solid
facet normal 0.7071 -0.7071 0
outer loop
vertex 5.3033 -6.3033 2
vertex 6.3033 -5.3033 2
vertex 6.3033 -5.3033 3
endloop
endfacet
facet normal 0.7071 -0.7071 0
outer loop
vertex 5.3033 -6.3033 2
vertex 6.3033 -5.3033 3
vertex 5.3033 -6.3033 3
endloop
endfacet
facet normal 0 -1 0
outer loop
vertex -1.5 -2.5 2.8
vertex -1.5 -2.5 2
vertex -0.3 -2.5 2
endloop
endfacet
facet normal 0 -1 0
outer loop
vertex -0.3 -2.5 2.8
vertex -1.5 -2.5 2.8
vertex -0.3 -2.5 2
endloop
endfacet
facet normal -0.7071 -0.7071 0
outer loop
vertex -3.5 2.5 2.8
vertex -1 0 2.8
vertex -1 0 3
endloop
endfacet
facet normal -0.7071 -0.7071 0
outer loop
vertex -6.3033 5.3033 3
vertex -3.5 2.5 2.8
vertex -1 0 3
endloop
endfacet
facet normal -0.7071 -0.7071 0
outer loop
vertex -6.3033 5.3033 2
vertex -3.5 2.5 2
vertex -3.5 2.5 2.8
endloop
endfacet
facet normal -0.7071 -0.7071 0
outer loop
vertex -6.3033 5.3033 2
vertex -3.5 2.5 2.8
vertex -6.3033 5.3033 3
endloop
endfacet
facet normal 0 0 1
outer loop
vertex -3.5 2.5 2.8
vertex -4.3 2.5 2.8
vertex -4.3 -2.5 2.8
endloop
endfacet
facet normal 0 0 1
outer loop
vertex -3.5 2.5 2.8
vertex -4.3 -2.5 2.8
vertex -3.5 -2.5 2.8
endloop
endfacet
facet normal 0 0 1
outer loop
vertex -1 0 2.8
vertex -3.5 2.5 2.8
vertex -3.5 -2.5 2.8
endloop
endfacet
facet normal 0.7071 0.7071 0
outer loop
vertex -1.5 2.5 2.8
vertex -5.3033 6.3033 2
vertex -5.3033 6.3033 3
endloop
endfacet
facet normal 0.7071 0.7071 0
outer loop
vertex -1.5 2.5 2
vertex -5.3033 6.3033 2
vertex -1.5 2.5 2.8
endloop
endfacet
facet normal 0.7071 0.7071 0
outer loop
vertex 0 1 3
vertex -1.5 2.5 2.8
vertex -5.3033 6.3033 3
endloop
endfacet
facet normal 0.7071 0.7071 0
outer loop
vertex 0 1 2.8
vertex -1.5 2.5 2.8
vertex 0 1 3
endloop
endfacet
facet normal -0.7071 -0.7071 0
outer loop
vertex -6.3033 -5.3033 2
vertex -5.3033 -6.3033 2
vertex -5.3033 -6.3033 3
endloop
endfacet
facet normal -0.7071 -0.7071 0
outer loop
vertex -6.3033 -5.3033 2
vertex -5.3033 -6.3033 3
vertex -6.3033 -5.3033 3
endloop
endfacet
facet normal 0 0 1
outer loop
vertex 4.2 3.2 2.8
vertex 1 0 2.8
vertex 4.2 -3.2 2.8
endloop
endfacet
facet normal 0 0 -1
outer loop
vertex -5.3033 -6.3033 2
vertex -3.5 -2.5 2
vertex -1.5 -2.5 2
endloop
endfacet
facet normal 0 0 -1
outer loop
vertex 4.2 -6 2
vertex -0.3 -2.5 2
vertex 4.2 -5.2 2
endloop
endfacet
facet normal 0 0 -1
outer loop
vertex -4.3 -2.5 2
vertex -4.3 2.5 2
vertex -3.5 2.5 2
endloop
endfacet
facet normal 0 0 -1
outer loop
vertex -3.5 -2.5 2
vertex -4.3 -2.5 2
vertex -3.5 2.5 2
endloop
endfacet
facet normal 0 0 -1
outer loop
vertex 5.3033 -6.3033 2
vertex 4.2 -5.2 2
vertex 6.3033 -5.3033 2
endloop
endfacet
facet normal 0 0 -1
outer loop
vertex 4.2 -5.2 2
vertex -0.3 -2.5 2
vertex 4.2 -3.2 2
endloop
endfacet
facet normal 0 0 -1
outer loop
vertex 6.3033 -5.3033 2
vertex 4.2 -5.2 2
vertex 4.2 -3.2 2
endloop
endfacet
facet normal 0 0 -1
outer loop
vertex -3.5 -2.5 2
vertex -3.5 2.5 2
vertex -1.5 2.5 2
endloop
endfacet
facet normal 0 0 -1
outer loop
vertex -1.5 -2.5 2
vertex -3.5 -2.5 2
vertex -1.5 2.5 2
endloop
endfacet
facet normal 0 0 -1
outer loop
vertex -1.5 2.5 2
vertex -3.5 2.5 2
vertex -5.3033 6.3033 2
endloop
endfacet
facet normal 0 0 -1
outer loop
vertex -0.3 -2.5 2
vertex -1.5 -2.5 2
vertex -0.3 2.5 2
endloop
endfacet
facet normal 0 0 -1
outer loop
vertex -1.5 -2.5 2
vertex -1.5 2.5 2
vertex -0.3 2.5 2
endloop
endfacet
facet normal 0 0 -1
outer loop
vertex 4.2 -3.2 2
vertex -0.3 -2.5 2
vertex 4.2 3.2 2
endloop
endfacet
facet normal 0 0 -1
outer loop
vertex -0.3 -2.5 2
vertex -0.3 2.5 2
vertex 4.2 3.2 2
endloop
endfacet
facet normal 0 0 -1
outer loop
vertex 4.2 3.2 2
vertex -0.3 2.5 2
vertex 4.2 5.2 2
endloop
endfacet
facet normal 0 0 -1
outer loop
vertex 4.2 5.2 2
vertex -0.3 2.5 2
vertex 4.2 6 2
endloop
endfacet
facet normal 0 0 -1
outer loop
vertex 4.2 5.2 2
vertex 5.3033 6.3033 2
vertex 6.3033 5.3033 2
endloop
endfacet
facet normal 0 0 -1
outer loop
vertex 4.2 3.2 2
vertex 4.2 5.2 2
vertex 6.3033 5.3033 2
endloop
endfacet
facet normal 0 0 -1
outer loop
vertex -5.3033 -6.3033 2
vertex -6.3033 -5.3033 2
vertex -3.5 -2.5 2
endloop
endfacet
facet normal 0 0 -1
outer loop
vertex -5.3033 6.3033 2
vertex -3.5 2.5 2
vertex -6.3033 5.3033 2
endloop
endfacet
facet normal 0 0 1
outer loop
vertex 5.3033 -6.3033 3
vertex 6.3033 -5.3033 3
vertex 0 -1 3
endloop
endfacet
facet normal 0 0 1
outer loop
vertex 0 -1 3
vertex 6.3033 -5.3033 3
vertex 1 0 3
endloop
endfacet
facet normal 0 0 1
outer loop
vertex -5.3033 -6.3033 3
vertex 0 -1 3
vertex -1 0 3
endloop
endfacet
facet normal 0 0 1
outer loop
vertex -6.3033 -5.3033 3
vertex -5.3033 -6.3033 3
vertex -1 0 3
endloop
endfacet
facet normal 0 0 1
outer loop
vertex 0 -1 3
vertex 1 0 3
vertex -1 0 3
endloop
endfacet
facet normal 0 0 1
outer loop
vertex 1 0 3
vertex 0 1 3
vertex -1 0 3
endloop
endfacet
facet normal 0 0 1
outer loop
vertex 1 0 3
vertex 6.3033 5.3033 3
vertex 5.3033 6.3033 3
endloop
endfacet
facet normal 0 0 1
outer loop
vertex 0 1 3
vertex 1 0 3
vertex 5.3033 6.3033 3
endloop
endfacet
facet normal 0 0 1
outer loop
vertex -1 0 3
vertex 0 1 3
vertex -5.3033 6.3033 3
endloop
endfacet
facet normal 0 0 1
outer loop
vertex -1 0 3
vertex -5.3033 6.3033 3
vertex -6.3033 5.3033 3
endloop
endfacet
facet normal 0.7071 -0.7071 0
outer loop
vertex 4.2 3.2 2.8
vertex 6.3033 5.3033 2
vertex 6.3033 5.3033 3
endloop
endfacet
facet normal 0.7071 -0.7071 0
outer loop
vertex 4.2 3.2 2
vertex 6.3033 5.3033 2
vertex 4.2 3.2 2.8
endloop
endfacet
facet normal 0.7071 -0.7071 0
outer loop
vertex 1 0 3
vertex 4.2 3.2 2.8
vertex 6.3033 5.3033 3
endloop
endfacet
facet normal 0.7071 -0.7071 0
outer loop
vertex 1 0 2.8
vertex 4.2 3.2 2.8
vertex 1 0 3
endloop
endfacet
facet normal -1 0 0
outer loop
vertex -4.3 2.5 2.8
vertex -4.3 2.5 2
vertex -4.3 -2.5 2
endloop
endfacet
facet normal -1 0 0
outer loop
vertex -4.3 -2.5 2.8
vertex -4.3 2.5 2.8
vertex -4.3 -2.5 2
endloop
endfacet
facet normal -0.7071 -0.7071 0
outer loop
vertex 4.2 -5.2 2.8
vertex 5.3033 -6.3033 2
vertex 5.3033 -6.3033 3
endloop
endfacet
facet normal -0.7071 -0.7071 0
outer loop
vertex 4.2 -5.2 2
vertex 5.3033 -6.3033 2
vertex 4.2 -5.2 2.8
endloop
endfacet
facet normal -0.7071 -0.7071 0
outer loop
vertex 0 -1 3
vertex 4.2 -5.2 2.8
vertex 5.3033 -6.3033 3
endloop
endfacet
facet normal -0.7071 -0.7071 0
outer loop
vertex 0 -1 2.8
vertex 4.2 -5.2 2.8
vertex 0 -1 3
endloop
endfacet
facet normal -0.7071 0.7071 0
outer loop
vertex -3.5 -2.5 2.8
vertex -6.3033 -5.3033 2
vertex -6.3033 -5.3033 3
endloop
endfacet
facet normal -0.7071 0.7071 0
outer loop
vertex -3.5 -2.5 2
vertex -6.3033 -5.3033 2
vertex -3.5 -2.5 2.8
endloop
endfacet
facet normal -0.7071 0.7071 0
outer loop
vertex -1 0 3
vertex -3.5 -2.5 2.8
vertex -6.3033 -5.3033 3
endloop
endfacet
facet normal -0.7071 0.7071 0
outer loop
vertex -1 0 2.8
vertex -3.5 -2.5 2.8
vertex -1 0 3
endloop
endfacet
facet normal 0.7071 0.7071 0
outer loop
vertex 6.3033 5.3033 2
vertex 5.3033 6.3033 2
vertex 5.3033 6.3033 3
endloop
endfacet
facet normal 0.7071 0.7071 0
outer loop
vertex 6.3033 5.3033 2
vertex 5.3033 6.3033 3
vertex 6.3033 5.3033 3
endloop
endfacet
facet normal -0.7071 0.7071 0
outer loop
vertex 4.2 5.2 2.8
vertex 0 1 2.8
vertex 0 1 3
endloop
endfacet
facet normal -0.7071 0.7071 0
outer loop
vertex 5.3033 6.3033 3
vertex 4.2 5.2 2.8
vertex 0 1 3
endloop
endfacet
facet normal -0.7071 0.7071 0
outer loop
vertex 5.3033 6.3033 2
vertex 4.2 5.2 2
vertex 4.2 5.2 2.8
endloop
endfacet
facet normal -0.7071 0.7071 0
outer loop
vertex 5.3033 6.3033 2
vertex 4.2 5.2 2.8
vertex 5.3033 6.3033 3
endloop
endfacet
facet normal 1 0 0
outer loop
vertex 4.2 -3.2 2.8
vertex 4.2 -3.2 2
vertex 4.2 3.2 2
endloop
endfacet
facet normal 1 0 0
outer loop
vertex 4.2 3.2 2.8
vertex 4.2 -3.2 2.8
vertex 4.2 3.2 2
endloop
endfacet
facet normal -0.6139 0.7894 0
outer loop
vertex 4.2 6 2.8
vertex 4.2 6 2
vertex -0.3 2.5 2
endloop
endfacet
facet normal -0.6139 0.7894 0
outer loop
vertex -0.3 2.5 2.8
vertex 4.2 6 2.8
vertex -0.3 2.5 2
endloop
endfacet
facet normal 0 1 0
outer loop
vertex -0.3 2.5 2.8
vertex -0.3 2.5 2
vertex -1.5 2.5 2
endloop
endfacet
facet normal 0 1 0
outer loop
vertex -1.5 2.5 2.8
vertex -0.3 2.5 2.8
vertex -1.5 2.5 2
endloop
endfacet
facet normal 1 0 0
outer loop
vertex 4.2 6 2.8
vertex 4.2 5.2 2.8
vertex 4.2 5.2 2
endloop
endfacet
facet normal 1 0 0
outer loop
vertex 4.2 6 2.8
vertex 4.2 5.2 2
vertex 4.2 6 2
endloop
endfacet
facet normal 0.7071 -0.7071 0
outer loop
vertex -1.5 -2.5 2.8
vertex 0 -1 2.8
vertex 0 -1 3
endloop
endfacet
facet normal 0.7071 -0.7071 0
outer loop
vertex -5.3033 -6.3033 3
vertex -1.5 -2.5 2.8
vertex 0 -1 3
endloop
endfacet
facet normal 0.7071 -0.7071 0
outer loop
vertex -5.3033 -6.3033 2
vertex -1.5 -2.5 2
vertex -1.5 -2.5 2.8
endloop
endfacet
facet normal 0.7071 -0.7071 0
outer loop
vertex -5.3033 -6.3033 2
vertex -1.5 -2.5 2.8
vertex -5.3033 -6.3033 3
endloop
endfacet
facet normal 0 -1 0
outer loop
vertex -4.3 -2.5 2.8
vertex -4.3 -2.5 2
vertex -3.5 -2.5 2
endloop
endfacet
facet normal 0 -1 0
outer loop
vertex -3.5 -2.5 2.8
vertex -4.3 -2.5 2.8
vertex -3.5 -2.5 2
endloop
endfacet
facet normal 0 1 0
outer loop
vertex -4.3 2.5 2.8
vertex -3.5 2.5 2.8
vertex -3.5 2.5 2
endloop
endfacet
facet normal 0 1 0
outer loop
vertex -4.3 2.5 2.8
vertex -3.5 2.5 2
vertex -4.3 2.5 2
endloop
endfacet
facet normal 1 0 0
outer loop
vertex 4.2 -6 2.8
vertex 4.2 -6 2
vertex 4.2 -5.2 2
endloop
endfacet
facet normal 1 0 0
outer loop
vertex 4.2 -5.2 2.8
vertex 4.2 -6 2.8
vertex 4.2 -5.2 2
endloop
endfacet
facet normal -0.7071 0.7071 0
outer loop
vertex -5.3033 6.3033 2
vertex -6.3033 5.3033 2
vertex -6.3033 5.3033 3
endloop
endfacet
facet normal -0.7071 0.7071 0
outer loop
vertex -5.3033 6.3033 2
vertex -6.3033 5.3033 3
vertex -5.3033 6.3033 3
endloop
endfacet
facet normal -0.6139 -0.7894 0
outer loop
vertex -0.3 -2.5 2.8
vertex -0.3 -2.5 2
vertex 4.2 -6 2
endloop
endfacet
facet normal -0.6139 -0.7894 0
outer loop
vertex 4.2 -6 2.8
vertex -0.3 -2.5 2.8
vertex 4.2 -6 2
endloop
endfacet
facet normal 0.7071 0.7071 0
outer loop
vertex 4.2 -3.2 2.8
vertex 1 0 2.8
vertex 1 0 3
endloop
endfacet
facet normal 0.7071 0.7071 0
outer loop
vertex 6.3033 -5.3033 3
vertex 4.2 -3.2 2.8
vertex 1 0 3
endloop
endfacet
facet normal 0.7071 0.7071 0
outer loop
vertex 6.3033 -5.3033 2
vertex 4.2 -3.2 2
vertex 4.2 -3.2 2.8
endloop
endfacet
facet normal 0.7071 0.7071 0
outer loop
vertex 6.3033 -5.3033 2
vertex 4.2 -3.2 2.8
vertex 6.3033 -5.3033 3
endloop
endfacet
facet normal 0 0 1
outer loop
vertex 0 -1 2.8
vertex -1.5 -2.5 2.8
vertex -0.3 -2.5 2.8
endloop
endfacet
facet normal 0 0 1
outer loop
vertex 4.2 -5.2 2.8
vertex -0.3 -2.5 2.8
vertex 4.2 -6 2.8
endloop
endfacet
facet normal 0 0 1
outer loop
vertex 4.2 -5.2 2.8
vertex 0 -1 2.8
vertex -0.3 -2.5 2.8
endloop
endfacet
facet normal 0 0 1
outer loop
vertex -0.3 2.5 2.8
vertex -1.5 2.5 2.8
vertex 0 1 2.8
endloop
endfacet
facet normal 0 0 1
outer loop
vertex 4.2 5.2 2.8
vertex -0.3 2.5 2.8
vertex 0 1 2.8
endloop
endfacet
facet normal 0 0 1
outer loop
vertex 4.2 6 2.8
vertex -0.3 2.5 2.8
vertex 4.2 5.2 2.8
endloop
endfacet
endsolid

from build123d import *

# Parameters (mm, degrees)
PAD007_DEPTH = 0.8
PAD006_DEPTH = 1


with BuildPart() as lautsprecher:
    # Sketch013 → Pad007 (new body)
    with BuildSketch(Plane.XY):
        Polygon((-14.5, 2.5), (-14.5, -2.5), (-10.5, -2.5), (-6, -6), (-6, 6), (-10.5, 2.5), align=None)
    extrude(amount=PAD007_DEPTH)


with BuildPart() as lautsprecher_1:
    # Body008 placement: moved
    add(lautsprecher.part.moved(Location((10.2, 0, 2))))


with BuildPart() as bild_mute:
    # Sketch014 → Pad006 (new body)
    with BuildSketch(Plane.XY):
        Polygon((-5.303301, 6.303301), (0, 1), (5.303301, 6.303301), (6.303301, 5.303301), (1, 0), (6.303301, -5.303301), (5.303301, -6.303301), (0, -1), (-5.303301, -6.303301), (-6.303301, -5.303301), (-1, 0), (-6.303301, 5.303301), align=None)
    extrude(amount=PAD006_DEPTH)


with BuildPart() as bild_mute_1:
    # Body009 placement: moved
    add(bild_mute.part.moved(Location((0, 0, 2))))

    # Fusion003: union Lautsprecher
    add(lautsprecher_1.part)


solid = bild_mute_1.part
